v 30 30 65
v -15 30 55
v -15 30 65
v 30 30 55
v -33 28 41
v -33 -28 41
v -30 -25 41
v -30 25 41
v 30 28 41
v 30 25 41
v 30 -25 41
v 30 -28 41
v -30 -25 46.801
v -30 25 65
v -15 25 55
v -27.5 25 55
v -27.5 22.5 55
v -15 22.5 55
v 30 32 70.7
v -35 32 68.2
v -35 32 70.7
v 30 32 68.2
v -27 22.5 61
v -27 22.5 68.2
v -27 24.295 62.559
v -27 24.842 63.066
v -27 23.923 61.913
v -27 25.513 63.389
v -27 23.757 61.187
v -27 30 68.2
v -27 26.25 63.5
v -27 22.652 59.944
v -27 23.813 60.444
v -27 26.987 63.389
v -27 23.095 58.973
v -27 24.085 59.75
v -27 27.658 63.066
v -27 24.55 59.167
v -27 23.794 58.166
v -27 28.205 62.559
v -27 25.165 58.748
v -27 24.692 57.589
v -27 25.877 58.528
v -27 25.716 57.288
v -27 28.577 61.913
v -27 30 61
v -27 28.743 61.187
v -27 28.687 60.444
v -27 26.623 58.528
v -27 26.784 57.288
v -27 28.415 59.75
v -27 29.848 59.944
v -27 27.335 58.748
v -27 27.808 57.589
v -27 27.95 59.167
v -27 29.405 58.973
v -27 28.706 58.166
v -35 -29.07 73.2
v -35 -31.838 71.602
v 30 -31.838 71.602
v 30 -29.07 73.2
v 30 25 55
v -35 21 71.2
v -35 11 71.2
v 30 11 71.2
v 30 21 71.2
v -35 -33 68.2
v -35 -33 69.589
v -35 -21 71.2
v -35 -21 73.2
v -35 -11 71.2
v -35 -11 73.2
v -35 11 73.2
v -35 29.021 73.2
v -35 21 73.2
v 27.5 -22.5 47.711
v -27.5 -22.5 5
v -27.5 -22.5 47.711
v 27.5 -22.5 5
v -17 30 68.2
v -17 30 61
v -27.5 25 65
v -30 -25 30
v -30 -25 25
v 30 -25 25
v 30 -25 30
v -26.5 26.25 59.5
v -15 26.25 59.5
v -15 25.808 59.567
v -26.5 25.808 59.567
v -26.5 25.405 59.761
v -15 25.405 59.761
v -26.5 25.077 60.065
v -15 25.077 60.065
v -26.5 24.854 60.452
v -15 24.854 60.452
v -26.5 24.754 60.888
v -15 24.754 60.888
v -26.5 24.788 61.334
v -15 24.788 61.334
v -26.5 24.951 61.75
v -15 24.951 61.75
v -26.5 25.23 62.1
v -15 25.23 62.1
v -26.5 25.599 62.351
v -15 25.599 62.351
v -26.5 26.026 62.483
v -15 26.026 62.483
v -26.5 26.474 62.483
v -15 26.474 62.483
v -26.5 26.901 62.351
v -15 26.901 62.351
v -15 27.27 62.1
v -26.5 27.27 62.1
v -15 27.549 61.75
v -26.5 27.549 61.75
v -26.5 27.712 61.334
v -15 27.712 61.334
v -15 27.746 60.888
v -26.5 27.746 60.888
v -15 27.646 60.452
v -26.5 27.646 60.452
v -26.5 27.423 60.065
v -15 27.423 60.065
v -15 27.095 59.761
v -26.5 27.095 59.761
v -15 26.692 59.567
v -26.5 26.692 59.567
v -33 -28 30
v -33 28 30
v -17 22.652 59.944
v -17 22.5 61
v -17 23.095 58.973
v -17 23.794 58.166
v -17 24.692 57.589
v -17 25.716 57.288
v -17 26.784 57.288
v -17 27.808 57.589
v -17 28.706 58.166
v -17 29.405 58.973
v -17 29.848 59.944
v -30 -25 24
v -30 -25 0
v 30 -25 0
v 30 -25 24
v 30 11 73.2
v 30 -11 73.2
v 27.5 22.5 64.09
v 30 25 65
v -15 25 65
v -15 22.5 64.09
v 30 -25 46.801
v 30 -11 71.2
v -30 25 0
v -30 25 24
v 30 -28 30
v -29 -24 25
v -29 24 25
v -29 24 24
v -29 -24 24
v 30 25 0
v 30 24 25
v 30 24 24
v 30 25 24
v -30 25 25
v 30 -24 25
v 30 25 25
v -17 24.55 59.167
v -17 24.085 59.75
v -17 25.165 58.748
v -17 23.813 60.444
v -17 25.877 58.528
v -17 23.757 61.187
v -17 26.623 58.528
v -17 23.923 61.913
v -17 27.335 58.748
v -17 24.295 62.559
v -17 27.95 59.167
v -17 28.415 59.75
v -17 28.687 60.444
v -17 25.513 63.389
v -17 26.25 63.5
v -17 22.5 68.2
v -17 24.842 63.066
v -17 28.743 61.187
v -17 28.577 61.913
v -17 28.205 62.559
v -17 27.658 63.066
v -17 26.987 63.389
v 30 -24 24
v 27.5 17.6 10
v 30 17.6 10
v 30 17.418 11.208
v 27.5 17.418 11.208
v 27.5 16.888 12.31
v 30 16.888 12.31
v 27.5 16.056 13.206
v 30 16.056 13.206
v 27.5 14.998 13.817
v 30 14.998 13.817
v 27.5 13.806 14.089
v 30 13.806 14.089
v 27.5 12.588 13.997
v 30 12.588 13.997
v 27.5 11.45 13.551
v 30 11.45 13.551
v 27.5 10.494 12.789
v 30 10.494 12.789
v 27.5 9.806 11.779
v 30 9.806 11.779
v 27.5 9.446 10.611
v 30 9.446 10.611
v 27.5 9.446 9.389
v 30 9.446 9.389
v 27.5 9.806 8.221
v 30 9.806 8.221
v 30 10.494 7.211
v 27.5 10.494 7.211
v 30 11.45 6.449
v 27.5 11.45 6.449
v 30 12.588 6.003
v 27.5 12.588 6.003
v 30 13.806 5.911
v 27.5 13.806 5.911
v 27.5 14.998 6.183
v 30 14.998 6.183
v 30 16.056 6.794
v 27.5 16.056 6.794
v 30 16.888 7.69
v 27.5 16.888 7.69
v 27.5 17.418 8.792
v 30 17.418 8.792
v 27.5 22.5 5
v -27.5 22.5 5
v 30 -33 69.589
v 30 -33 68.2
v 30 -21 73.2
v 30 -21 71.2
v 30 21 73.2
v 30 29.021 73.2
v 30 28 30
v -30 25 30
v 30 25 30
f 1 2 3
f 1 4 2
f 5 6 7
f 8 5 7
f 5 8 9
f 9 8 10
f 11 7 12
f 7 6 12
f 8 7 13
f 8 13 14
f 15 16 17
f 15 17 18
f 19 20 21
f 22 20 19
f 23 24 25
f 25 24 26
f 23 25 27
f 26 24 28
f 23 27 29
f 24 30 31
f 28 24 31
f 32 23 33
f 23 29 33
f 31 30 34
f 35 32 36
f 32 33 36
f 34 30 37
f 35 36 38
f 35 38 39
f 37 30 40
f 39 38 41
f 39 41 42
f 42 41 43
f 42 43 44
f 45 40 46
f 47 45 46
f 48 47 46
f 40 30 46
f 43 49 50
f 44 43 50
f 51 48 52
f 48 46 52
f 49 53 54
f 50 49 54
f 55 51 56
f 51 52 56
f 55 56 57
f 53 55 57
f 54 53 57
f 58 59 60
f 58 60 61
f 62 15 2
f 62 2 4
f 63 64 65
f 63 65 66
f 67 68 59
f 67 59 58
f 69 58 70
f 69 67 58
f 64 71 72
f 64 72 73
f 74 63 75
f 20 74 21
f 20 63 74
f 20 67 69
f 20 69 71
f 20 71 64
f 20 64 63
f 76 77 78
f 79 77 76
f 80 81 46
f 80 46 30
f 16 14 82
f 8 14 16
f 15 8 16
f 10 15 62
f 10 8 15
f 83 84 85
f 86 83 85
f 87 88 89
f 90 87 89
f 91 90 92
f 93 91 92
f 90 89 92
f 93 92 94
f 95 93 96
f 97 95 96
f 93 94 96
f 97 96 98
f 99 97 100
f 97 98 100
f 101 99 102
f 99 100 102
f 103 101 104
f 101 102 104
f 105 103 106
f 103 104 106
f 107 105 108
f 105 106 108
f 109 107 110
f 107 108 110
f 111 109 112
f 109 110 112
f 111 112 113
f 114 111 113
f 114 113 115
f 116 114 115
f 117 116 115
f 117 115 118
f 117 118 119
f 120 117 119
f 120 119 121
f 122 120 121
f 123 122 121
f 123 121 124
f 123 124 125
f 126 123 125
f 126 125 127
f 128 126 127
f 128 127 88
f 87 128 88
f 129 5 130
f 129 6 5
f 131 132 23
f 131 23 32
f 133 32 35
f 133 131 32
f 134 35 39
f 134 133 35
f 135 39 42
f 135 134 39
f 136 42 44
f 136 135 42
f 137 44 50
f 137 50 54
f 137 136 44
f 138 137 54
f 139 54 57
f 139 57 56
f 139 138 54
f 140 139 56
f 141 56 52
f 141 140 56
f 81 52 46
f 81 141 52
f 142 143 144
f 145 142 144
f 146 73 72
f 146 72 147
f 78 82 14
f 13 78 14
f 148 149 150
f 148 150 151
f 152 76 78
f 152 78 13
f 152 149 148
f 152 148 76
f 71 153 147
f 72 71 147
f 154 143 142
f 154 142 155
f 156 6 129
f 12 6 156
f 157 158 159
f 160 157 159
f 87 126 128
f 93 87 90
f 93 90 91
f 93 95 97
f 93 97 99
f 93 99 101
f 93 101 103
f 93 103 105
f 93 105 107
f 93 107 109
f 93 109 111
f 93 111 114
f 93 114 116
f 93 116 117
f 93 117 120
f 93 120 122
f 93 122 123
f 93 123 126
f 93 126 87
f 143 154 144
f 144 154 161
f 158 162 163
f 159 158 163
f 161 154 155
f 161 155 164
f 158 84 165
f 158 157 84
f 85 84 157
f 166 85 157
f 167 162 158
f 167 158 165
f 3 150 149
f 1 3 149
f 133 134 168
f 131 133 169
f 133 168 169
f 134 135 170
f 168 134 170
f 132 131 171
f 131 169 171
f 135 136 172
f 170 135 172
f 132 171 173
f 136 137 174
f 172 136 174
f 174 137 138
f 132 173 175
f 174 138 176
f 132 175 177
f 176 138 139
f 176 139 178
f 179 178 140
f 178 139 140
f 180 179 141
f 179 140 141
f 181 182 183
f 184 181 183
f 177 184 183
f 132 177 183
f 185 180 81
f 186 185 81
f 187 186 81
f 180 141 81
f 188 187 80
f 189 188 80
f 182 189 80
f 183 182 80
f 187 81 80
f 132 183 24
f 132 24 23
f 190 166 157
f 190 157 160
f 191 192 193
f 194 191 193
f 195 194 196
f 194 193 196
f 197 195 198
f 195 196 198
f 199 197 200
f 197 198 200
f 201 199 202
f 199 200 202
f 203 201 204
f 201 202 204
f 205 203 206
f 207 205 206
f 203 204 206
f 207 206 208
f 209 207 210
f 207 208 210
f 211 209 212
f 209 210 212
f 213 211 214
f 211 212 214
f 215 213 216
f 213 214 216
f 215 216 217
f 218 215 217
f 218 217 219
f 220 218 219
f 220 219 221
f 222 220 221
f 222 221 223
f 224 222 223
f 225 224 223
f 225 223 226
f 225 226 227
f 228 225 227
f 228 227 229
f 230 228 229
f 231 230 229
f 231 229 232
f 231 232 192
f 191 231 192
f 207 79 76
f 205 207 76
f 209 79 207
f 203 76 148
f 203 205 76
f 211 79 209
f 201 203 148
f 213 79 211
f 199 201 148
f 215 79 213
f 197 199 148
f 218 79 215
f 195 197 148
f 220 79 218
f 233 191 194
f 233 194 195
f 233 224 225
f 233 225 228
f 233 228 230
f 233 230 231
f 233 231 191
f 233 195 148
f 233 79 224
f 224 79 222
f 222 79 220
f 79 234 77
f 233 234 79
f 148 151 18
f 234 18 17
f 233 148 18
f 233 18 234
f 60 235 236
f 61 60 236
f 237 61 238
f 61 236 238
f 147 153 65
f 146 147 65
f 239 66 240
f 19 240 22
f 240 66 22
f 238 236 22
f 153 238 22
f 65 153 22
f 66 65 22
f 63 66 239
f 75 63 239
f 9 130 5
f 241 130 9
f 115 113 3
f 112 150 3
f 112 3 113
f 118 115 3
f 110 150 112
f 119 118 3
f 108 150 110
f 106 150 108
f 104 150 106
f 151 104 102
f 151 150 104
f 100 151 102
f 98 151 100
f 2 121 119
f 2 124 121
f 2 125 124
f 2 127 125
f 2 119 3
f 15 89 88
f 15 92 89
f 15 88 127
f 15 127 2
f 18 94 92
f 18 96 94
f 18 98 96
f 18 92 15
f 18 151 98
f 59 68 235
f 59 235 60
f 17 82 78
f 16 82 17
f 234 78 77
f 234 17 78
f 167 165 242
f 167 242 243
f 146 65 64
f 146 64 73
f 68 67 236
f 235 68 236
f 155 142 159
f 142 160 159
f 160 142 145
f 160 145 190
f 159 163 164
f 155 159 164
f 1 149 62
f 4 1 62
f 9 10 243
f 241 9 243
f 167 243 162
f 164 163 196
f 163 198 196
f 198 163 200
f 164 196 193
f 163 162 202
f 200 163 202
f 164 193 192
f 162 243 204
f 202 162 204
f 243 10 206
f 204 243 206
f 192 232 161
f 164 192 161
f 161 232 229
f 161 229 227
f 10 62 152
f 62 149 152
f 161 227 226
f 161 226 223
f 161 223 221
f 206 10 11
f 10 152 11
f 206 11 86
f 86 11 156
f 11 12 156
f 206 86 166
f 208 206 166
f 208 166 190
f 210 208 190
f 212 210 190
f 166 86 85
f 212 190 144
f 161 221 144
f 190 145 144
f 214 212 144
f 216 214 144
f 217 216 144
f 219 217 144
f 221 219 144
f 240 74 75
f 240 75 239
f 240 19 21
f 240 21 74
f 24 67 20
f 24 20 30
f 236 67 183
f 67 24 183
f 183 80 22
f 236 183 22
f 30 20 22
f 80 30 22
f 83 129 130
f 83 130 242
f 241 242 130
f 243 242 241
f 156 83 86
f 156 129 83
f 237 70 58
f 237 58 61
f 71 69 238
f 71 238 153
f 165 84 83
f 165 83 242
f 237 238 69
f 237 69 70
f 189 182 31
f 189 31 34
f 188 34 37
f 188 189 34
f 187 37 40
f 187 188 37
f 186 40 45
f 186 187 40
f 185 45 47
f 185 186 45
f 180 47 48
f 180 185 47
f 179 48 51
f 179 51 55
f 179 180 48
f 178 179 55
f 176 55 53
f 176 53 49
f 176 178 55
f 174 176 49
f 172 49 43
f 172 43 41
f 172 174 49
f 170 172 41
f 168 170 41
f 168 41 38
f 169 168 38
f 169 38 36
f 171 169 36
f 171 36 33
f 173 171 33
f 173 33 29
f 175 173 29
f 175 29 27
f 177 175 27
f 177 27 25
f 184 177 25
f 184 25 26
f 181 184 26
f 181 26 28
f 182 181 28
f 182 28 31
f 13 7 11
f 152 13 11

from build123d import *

# Parameters (mm, degrees)
CROQUIS2_W               = 60
CROQUIS2_H               = 50
SALIENTE_EXTRUIR2_DEPTH  = 5
CROQUIS3_W               = 60
CROQUIS3_H               = 50
CROQUIS3_W_2             = 55
CROQUIS3_H_2             = 45
SALIENTE_EXTRUIR3_DEPTH  = 60
CROQUIS4_R               = 4.1
CORTAR_EXTRUIR2_DEPTH    = 5
CORTAR_EXTRUIR3_DEPTH    = 92.923881554
CROQUIS18_W              = 11
CROQUIS18_H              = 50
SALIENTE_EXTRUIR10_DEPTH = 3
CROQUIS19_W              = 63
CROQUIS19_H              = 11
SALIENTE_EXTRUIR11_DEPTH = 3
CROQUIS20_W              = 63
CROQUIS20_H              = 11
SALIENTE_EXTRUIR12_DEPTH = 3
CROQUIS21_W              = 1
CROQUIS21_H              = 1
CORTAR_EXTRUIR8_DEPTH    = 65
CROQUIS23_W              = 1
CROQUIS23_H              = 1
CORTAR_EXTRUIR10_DEPTH   = 65
CROQUIS22_W              = 1
CROQUIS22_H              = 1
CORTAR_EXTRUIR9_DEPTH    = 65
CROQUIS29_W              = 45
CROQUIS29_H              = 10
SALIENTE_EXTRUIR13_DEPTH = 5
CROQUIS30_W              = 12.5
CROQUIS30_H              = 10
CORTAR_EXTRUIR11_DEPTH   = 3
CROQUIS31_R              = 1.5
SALIENTE_EXTRUIR14_DEPTH = 11.5
CROQUIS32_R              = 2.5
SALIENTE_EXTRUIR15_DEPTH = 12
CROQUIS33_W              = 15
CROQUIS33_H              = 9.46236556
CROQUIS33_R              = 1.5
CORTAR_EXTRUIR12_DEPTH   = 2
CROQUIS34_W              = 65
CROQUIS34_H              = 65
SALIENTE_EXTRUIR16_DEPTH = 5
CORTAR_EXTRUIR13_DEPTH   = 65
CORTAR_EXTRUIR14_DEPTH   = 65
CROQUIS38_W              = 2
CROQUIS38_H              = 10
CORTAR_EXTRUIR15_DEPTH   = 65


with BuildPart() as part:
    # Croquis2 → Saliente-Extruir2 (new body)
    with BuildSketch(Plane.XY):
        Rectangle(CROQUIS2_W, CROQUIS2_H)
    extrude(amount=SALIENTE_EXTRUIR2_DEPTH)

    # Croquis3 → Saliente-Extruir3 (add)
    with BuildSketch(Plane.XY.offset(5)):
        Rectangle(CROQUIS3_W, CROQUIS3_H)
        Rectangle(CROQUIS3_W_2, CROQUIS3_H_2, mode=Mode.SUBTRACT)
    extrude(amount=SALIENTE_EXTRUIR3_DEPTH)

    # Croquis4 → Cortar-Extruir2 (cut)
    with BuildSketch(Plane(origin=(30, 0, 0), x_dir=(0, 0, -1), z_dir=(1, 0, 0))):
        with Locations(Location((-10, 13.5, 0), (0, 0, 90))):
            Circle(CROQUIS4_R)
    extrude(amount=-CORTAR_EXTRUIR2_DEPTH, mode=Mode.SUBTRACT)

    # Croquis5 → Cortar-Extruir3 (cut, through all)
    with BuildSketch(Plane(origin=(30, 0, 0), x_dir=(0, 0, -1), z_dir=(1, 0, 0))):
        Polygon((-65, 25), (-46.801488287, -25), (-65, -25), align=None)
    extrude(amount=-CORTAR_EXTRUIR3_DEPTH, mode=Mode.SUBTRACT)

    # Croquis18 → Saliente-Extruir10 (add)
    with BuildSketch(Plane.ZY.offset(30)):
        with Locations((35.5, 0)):
            Rectangle(CROQUIS18_W, CROQUIS18_H)
    extrude(amount=SALIENTE_EXTRUIR10_DEPTH)

    # Croquis19 → Saliente-Extruir11 (add)
    with BuildSketch(Plane.XZ.offset(25)):
        with Locations((-1.5, 35.5)):
            Rectangle(CROQUIS19_W, CROQUIS19_H)
    extrude(amount=SALIENTE_EXTRUIR11_DEPTH)

    # Croquis20 → Saliente-Extruir12 (add)
    with BuildSketch(Plane(origin=(0, 25, 0), x_dir=(1, 0, 0), z_dir=(0, 1, 0))):
        with Locations((-1.5, -35.5)):
            Rectangle(CROQUIS20_W, CROQUIS20_H)
    extrude(amount=SALIENTE_EXTRUIR12_DEPTH)

    # Croquis21 → Cortar-Extruir8 (cut)
    with BuildSketch(Plane(origin=(30, 0, 0), x_dir=(0, 0, -1), z_dir=(1, 0, 0))):
        with Locations((-24.5, -24.5)):
            Rectangle(CROQUIS21_W, CROQUIS21_H)
    extrude(amount=-CORTAR_EXTRUIR8_DEPTH, mode=Mode.SUBTRACT)

    # Croquis23 → Cortar-Extruir10 (cut)
    with BuildSketch(Plane(origin=(30, 0, 0), x_dir=(0, 0, -1), z_dir=(1, 0, 0))):
        with Locations((-24.5, 24.5)):
            Rectangle(CROQUIS23_W, CROQUIS23_H)
    extrude(amount=-CORTAR_EXTRUIR10_DEPTH, mode=Mode.SUBTRACT)

    # Croquis22 → Cortar-Extruir9 (cut)
    with BuildSketch(Plane(origin=(0, 25, 0), x_dir=(1, 0, 0), z_dir=(0, 1, 0))):
        with Locations((-29.5, -24.5)):
            Rectangle(CROQUIS22_W, CROQUIS22_H)
    extrude(amount=-CORTAR_EXTRUIR9_DEPTH, mode=Mode.SUBTRACT)

    # Croquis29 → Saliente-Extruir13 (add)
    with BuildSketch(Plane(origin=(0, 25, 0), x_dir=(1, 0, 0), z_dir=(0, 1, 0))):
        with Locations((7.5, -60)):
            Rectangle(CROQUIS29_W, CROQUIS29_H)
    extrude(amount=SALIENTE_EXTRUIR13_DEPTH)

    # Croquis30 → Cortar-Extruir11 (cut)
    with BuildSketch(Plane(origin=(0, 25, 0), x_dir=(1, 0, 0), z_dir=(0, 1, 0))):
        with Locations((-21.25, -60)):
            Rectangle(CROQUIS30_W, CROQUIS30_H)
    extrude(amount=-CORTAR_EXTRUIR11_DEPTH, mode=Mode.SUBTRACT)

    # Croquis31 → Saliente-Extruir14 (add)
    with BuildSketch(Plane.ZY.offset(15)):
        with Locations(Location((61, 26.25, 0), (0, 0, 180))):
            Circle(CROQUIS31_R)
    extrude(amount=SALIENTE_EXTRUIR14_DEPTH)

    # Croquis32 → Saliente-Extruir15 (add)
    with BuildSketch(Plane.ZY.offset(15)):
        with BuildLine():
            Line((61, 30), (68.2, 30))
            Line((68.2, 30), (68.2, 22.5))
            Line((68.2, 22.5), (61, 22.5))
            ThreePointArc((61, 22.5), (57.25, 26.25), (61, 30))
        make_face()
        with Locations((61, 26.25)):
            Circle(CROQUIS32_R, mode=Mode.SUBTRACT)
    extrude(amount=SALIENTE_EXTRUIR15_DEPTH)

    # Croquis33 → Cortar-Extruir12 (cut)
    with BuildSketch(Plane.ZY.offset(15)):
        with Locations((62.5, 27.23118278)):
            Rectangle(CROQUIS33_W, CROQUIS33_H)
        with Locations(Location((61, 26.25, 0), (0, 0, 180))):
            Circle(CROQUIS33_R, mode=Mode.SUBTRACT)
    extrude(amount=CORTAR_EXTRUIR12_DEPTH, mode=Mode.SUBTRACT)


with BuildPart() as cortar_extruir12_piece_1:
    # of the separate pieces the step leaves, piece 1, a body of its own (cortar_extruir12_pieces)
    add(part.part.solids().sort_by_distance((-30, 25, 0))[0])


with BuildPart() as cortar_extruir12_piece_2:
    # of the separate pieces the step leaves, piece 2, a body of its own (cortar_extruir12_pieces)
    add(part.part.solids().sort_by_distance((-17, 30, 61))[0])

    # Croquis34 → Saliente-Extruir16 (add)
    with BuildSketch(Plane.XY.offset(68.2)):
        with Locations((-2.5, -0.5)):
            Rectangle(CROQUIS34_W, CROQUIS34_H)
    extrude(amount=SALIENTE_EXTRUIR16_DEPTH)

    # Croquis36 → Cortar-Extruir13 (cut)
    with BuildSketch(Plane(origin=(30, 0, 0), x_dir=(0, 0, -1), z_dir=(1, 0, 0))):
        Polygon((-70.7, 32), (-73.2, 29.020616019), (-73.2, 32), align=None)
    extrude(amount=-CORTAR_EXTRUIR13_DEPTH, mode=Mode.SUBTRACT)

    # Croquis37 → Cortar-Extruir14 (cut)
    with BuildSketch(Plane(origin=(30, 0, 0), x_dir=(0, 0, -1), z_dir=(1, 0, 0))):
        Polygon((-69.58947368, -33), (-71.601679744, -31.838252288), (-73.2, -29.069880397), (-73.2, -33), align=None)
    extrude(amount=-CORTAR_EXTRUIR14_DEPTH, mode=Mode.SUBTRACT)

    # Croquis38 → Cortar-Extruir15 (cut)
    with BuildSketch(Plane.ZY.offset(35)):
        with Locations((72.2, -16)):
            Rectangle(CROQUIS38_W, CROQUIS38_H)
        with Locations((72.2, 16)):
            Rectangle(CROQUIS38_W, CROQUIS38_H)
    extrude(amount=-CORTAR_EXTRUIR15_DEPTH, mode=Mode.SUBTRACT)


solid = Compound([cortar_extruir12_piece_1.part, cortar_extruir12_piece_2.part])
